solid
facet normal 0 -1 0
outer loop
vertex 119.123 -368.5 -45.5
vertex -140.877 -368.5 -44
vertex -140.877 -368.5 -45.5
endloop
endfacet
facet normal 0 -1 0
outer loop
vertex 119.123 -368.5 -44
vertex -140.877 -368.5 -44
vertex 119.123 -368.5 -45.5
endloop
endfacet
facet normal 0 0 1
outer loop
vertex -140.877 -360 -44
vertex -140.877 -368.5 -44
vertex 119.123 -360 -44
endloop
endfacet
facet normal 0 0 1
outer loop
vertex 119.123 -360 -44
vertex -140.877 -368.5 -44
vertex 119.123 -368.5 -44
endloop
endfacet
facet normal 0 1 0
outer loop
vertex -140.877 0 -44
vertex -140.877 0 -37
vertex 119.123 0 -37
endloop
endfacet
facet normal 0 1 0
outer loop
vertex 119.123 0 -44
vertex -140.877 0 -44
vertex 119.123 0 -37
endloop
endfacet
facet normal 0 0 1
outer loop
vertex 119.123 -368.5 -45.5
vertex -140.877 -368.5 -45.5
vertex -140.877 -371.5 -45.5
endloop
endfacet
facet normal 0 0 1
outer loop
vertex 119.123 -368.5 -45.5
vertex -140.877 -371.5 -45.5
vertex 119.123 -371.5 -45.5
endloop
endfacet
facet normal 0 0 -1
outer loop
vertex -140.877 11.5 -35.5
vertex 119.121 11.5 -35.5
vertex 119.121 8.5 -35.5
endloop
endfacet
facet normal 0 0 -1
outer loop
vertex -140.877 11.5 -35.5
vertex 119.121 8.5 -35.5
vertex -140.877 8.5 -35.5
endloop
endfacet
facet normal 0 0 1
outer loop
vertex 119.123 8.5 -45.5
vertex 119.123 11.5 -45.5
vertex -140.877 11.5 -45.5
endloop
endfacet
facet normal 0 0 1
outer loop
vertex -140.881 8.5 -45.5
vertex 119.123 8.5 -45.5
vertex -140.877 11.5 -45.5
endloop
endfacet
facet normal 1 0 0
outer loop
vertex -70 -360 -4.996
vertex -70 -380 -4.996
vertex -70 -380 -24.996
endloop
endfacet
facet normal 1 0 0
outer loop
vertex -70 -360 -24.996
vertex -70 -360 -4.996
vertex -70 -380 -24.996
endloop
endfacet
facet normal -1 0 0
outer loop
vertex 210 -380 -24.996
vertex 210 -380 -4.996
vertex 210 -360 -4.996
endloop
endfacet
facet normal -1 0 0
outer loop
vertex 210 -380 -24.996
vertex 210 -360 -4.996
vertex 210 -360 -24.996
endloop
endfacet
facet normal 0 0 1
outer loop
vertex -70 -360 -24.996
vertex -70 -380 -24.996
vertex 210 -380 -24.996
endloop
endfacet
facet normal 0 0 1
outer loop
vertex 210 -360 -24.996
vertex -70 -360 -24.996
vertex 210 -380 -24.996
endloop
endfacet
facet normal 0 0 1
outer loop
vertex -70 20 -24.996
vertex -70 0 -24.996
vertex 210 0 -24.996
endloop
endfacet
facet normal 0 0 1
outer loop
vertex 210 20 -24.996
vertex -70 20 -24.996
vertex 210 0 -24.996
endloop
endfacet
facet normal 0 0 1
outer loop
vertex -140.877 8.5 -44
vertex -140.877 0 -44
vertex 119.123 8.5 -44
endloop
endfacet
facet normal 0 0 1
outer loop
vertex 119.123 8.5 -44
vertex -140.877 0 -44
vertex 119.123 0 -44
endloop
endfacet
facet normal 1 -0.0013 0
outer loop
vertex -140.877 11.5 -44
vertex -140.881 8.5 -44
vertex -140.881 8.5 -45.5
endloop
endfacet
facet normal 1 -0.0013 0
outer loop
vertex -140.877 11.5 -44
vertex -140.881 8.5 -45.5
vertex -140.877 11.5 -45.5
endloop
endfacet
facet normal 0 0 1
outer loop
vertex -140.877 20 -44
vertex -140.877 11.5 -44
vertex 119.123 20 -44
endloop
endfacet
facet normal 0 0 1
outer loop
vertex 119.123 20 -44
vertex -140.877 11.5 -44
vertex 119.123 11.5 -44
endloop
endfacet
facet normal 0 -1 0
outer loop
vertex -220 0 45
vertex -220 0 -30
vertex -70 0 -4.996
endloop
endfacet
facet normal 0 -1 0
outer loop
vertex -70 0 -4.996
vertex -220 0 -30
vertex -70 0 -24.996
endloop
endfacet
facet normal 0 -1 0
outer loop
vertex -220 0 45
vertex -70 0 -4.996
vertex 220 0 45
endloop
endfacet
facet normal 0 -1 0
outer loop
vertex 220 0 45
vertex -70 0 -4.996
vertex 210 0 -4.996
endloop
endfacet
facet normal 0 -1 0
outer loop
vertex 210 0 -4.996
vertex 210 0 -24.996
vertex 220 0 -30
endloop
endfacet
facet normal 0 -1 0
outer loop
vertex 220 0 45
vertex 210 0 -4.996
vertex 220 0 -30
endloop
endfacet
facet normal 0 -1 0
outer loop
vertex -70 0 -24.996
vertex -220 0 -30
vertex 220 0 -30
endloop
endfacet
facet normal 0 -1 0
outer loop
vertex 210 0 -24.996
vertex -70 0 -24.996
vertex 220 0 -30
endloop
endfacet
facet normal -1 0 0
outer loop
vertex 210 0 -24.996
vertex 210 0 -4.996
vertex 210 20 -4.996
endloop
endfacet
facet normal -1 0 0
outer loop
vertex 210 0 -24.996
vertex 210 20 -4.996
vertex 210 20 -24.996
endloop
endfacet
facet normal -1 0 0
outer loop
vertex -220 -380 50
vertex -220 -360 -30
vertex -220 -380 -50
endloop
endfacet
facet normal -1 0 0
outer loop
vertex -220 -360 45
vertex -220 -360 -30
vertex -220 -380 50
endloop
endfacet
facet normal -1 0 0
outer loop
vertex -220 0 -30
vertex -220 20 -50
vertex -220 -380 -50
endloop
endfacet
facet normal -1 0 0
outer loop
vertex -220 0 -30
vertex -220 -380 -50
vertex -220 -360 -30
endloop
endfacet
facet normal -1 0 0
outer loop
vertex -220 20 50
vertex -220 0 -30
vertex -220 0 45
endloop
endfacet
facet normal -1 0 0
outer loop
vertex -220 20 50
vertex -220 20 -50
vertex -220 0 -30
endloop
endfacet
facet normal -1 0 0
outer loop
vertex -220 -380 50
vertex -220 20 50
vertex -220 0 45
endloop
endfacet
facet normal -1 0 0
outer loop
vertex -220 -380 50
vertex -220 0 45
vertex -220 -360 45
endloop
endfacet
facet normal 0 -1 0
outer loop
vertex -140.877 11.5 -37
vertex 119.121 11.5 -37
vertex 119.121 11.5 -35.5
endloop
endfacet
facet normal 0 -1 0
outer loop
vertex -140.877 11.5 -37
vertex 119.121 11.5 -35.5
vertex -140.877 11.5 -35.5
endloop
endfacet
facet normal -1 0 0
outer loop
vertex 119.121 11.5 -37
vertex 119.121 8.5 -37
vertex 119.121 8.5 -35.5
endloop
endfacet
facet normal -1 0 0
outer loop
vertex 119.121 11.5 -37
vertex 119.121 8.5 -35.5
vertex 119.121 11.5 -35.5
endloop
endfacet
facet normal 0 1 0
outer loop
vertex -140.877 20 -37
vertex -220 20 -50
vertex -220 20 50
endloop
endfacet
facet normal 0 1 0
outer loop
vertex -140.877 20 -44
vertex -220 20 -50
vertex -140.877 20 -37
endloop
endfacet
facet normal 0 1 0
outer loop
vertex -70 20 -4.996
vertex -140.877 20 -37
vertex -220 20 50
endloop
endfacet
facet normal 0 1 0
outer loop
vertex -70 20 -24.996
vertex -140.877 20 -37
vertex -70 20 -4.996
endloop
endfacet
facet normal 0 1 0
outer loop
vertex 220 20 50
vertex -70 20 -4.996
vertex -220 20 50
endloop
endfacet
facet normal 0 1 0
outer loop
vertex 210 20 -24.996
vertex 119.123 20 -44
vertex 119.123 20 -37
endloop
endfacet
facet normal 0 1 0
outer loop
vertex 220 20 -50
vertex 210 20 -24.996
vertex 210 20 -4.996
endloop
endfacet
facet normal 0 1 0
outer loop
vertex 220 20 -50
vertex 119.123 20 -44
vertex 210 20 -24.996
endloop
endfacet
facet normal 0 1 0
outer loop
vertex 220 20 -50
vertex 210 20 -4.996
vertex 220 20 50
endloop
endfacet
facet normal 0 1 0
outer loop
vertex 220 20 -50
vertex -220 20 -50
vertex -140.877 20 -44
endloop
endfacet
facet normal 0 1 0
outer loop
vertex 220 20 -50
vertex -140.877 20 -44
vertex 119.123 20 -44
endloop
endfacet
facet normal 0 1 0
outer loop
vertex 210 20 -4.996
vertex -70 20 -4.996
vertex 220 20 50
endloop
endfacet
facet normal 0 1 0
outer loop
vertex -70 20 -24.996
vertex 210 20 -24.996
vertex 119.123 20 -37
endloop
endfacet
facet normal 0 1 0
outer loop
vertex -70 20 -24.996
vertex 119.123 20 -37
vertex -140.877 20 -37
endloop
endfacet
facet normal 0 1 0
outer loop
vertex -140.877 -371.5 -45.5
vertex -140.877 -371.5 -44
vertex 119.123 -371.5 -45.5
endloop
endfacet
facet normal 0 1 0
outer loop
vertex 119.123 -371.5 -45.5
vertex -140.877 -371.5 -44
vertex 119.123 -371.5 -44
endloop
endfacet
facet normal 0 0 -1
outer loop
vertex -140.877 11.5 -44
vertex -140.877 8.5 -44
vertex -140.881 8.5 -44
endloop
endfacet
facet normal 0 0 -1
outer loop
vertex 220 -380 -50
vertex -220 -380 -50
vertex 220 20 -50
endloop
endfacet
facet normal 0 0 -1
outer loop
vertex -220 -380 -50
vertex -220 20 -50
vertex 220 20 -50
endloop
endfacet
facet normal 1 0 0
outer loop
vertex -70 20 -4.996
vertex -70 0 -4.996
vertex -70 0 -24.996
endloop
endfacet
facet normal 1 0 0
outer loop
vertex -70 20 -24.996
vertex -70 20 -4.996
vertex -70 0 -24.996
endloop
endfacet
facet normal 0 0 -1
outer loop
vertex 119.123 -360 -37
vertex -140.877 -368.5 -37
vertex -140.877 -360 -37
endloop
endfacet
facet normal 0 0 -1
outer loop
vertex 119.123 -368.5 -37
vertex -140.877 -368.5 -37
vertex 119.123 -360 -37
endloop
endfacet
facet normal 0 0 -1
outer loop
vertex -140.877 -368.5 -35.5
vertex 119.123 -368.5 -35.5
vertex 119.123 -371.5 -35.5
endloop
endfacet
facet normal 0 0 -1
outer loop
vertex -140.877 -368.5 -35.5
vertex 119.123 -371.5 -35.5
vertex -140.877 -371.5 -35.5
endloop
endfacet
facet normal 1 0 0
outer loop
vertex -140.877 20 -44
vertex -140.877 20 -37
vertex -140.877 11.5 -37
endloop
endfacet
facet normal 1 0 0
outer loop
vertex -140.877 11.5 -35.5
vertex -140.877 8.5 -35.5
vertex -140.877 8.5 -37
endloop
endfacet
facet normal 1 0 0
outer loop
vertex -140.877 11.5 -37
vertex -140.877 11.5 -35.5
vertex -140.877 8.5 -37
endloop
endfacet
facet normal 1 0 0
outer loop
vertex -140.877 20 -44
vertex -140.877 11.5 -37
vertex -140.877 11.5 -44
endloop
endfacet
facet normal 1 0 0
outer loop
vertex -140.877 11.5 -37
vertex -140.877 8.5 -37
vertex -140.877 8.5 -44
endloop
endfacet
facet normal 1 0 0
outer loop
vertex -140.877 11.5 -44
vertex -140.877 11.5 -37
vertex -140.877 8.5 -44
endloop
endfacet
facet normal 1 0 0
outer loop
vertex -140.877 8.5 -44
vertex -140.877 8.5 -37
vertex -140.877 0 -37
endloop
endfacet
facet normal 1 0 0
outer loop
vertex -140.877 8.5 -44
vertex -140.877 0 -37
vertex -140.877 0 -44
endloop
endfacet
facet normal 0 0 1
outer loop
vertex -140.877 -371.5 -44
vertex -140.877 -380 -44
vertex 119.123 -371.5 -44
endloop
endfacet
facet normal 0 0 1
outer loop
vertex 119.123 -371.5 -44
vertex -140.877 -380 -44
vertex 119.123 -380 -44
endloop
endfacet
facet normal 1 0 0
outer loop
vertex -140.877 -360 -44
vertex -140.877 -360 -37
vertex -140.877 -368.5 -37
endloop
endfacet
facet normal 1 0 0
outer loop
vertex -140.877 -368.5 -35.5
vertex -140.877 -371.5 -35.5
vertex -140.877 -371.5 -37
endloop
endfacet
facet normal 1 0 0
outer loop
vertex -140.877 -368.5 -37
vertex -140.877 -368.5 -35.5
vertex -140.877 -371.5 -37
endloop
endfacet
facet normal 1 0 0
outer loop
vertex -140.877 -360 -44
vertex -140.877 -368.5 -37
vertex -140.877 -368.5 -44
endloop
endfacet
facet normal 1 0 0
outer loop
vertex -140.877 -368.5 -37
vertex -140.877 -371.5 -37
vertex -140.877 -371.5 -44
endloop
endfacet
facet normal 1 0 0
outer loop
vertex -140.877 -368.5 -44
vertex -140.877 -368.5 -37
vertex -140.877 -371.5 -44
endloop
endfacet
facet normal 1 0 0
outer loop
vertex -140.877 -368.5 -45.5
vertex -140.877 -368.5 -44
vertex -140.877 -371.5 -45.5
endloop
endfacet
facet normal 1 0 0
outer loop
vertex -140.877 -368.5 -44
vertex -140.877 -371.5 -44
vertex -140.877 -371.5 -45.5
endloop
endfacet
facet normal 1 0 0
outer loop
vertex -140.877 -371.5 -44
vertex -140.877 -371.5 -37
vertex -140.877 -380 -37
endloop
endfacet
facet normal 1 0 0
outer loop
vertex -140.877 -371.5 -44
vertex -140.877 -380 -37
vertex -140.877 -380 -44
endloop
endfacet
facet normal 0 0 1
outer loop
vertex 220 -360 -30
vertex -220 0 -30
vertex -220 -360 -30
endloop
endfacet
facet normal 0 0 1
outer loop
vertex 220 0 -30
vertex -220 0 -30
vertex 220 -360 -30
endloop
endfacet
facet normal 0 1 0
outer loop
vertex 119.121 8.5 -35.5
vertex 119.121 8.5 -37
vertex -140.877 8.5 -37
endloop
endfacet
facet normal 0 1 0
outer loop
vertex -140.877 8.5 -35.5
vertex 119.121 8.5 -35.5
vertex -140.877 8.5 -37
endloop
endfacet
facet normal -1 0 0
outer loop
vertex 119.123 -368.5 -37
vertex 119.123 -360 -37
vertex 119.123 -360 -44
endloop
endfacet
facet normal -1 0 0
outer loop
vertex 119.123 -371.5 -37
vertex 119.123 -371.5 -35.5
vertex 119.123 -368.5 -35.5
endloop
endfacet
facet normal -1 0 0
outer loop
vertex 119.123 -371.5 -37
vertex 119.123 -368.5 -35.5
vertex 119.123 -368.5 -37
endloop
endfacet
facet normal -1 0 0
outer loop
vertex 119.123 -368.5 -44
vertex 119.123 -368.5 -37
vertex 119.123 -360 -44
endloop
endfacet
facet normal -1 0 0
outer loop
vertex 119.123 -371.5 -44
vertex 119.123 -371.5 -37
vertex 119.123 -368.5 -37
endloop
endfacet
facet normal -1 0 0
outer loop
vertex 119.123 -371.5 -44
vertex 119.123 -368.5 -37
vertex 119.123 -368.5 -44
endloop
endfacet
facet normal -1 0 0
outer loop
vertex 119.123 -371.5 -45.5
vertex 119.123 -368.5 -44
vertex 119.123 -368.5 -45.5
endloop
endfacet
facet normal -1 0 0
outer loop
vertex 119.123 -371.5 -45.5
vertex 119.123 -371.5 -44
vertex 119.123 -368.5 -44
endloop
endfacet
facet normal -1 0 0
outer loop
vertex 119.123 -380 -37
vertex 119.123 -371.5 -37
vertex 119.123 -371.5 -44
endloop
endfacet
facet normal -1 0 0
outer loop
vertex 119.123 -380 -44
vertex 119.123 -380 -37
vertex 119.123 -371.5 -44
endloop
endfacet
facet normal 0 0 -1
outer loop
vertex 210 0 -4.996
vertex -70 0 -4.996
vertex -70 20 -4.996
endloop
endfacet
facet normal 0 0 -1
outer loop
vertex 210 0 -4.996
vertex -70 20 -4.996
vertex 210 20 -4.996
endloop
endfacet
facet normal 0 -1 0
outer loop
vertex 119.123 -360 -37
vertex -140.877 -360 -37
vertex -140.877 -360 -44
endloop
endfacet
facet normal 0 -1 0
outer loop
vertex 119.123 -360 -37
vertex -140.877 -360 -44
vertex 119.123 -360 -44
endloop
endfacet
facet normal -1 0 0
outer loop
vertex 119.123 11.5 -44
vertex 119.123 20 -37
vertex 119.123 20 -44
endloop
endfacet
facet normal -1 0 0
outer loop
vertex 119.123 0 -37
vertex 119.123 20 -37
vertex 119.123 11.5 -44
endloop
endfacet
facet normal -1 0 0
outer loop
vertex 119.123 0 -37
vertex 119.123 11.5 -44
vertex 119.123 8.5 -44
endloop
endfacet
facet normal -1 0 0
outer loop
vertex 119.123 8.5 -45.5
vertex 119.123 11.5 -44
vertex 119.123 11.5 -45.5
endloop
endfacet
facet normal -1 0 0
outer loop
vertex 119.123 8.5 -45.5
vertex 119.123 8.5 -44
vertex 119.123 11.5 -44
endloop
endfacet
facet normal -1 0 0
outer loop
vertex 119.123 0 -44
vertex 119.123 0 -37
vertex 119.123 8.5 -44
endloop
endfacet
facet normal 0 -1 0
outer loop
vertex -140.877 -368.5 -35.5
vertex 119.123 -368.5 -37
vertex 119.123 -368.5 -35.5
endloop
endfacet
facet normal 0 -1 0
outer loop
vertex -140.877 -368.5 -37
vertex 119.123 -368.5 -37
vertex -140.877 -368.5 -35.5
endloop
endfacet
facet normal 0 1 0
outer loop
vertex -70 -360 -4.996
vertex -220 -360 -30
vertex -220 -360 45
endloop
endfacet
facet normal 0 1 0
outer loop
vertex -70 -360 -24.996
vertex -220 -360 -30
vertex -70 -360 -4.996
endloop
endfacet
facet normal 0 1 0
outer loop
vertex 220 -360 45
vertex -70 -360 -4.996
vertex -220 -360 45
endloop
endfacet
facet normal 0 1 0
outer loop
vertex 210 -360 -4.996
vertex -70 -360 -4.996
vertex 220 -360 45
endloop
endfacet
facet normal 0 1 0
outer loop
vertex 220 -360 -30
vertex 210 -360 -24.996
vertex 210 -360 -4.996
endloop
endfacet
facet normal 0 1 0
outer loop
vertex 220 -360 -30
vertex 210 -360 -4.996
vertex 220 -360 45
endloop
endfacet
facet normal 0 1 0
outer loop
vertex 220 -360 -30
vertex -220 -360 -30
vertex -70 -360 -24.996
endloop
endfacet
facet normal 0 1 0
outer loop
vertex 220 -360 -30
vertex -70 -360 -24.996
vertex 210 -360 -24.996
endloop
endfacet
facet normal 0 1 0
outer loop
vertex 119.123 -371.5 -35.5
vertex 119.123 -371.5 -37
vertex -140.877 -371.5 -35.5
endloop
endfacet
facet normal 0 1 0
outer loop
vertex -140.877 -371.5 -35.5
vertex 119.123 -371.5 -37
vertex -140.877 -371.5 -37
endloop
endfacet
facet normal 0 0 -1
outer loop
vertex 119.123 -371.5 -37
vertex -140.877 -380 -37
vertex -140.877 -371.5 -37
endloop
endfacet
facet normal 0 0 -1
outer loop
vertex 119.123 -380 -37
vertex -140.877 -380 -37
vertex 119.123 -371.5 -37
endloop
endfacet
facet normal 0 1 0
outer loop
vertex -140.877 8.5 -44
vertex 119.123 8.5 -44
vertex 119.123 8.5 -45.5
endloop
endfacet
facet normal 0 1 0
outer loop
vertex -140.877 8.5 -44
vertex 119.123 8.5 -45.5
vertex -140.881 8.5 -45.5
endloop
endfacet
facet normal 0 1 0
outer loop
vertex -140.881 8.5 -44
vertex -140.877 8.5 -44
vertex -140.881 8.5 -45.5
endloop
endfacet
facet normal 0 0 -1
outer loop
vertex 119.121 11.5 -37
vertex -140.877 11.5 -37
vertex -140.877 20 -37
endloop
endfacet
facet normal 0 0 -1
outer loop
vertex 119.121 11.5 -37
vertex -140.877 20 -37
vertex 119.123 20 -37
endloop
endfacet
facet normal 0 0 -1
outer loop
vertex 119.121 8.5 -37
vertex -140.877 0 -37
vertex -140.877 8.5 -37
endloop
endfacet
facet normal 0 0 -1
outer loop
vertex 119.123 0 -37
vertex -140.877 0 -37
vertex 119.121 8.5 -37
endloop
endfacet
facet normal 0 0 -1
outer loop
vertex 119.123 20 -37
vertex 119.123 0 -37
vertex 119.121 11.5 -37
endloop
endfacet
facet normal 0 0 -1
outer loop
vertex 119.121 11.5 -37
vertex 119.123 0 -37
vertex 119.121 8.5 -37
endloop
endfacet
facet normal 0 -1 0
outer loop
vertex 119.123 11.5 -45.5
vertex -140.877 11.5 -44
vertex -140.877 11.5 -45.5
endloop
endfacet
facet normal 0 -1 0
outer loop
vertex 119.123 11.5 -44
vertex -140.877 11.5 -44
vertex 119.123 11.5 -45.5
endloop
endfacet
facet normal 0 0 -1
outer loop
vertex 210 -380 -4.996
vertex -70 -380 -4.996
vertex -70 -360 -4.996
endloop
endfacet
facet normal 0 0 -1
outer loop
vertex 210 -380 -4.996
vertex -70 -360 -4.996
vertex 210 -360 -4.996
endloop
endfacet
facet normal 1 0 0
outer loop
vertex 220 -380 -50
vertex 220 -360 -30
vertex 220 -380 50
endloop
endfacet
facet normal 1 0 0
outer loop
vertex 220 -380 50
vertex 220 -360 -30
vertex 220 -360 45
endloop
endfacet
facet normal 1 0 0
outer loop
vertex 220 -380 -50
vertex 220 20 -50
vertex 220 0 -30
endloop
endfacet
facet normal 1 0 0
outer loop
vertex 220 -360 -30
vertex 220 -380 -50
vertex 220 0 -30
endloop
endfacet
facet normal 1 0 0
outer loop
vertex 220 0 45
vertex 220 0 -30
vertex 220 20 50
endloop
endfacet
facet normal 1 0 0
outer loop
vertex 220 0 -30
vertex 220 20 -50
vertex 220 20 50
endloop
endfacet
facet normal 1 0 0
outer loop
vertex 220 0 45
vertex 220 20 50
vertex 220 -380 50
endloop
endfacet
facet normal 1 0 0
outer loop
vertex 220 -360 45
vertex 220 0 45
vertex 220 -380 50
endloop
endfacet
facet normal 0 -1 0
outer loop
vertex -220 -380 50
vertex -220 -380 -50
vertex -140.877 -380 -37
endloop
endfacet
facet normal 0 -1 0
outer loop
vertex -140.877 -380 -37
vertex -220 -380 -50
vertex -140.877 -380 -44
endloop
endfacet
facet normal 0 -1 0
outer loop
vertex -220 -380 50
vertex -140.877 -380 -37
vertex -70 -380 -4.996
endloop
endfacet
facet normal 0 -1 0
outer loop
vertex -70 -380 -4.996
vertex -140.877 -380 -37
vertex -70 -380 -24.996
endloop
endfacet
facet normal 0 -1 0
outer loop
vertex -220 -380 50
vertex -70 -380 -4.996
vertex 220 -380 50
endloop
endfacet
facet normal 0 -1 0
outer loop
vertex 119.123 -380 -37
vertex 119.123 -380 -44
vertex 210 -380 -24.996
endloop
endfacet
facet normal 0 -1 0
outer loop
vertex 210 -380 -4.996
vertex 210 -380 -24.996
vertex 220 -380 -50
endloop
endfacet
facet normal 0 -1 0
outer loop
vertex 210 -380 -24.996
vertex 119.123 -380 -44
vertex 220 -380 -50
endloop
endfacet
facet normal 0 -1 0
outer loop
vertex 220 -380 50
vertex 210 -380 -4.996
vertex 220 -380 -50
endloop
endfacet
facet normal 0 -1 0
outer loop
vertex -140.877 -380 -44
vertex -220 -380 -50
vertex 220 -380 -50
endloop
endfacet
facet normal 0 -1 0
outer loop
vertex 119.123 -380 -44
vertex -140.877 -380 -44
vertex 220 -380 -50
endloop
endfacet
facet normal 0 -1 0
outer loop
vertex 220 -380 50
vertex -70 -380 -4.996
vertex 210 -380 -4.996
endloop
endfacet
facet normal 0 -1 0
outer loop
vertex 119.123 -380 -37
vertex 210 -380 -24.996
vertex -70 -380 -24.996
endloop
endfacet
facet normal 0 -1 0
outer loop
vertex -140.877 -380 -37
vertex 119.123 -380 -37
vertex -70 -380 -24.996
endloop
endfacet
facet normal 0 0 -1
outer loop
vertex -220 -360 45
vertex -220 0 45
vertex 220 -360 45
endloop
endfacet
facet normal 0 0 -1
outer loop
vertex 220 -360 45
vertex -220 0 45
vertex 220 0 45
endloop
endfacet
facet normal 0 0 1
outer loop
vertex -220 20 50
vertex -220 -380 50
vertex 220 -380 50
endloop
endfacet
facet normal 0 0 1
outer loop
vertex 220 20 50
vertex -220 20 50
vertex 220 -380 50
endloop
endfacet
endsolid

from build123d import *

# Parameters (mm, degrees)
SKETCH1_W           = 440
SKETCH1_H           = 100
SKETCH1_W_2         = 280
SKETCH1_H_2         = 20
SKETCH1_W_3         = 260
SKETCH1_H_3         = 7
BOSS_EXTRUDE1_DEPTH = 20
SKETCH8_W           = 440
SKETCH8_H           = 5
BOSS_EXTRUDE2_DEPTH = 360
LPATTERN2_COUNT     = 2
LPATTERN2_PITCH     = 380
SKETCH10_W          = 440
SKETCH10_H          = 20
BOSS_EXTRUDE3_DEPTH = 360
SKETCH11_W          = 259.997812745
SKETCH11_H          = 3
CUT_EXTRUDE1_DEPTH  = 1.5
CUT_EXTRUDE2_DEPTH  = 1.5
SKETCH17_W          = 260
SKETCH17_H          = 3
CUT_EXTRUDE3_DEPTH  = 1.5
SKETCH18_W          = 260
SKETCH18_H          = 3
CUT_EXTRUDE4_DEPTH  = 1.5


with BuildPart() as part:
    # Sketch1 → Boss-Extrude1 (new body)
    with BuildSketch(Plane(origin=(0, 0, 0), x_dir=(1, 0, 0), z_dir=(0, 1, 0))):
        Rectangle(SKETCH1_W, SKETCH1_H)
        with Locations((70, 14.99604314)):
            Rectangle(SKETCH1_W_2, SKETCH1_H_2, mode=Mode.SUBTRACT)
        with Locations((-10.87698902, 40.5)):
            Rectangle(SKETCH1_W_3, SKETCH1_H_3, mode=Mode.SUBTRACT)
    boss_extrude1 = extrude(amount=BOSS_EXTRUDE1_DEPTH)

    # Sketch8 → Boss-Extrude2 (add)
    with BuildSketch(Plane.XZ):
        with Locations((0, 47.5)):
            Rectangle(SKETCH8_W, SKETCH8_H)
    extrude(amount=BOSS_EXTRUDE2_DEPTH)

    # LPattern2: Boss-Extrude1 ×2
    with Locations(*[(0, -i * LPATTERN2_PITCH, 0) for i in range(1, LPATTERN2_COUNT)]):
        add(boss_extrude1)

    # Sketch10 → Boss-Extrude3 (add)
    with BuildSketch(Plane.XZ):
        with Locations((0, -40)):
            Rectangle(SKETCH10_W, SKETCH10_H)
    extrude(amount=BOSS_EXTRUDE3_DEPTH)

    # Sketch11 → Cut-Extrude1 (cut)
    with BuildSketch(Plane(origin=(0, 0, -37), x_dir=(-1, 0, 0), z_dir=(0, 0, -1))):
        with Locations((10.878082647, 10)):
            Rectangle(SKETCH11_W, SKETCH11_H)
    extrude(amount=-CUT_EXTRUDE1_DEPTH, mode=Mode.SUBTRACT)

    # Sketch16 → Cut-Extrude2 (cut)
    with BuildSketch(Plane.XY.offset(-44)):
        Polygon((-140.87698902, 11.5), (119.12301098, 11.5), (119.12301098, 8.5), (-140.881315907, 8.5), align=None)
    extrude(amount=-CUT_EXTRUDE2_DEPTH, mode=Mode.SUBTRACT)

    # Sketch17 → Cut-Extrude3 (cut)
    with BuildSketch(Plane(origin=(0, 0, -37), x_dir=(-1, 0, 0), z_dir=(0, 0, -1))):
        with Locations((10.87698902, -370)):
            Rectangle(SKETCH17_W, SKETCH17_H)
    extrude(amount=-CUT_EXTRUDE3_DEPTH, mode=Mode.SUBTRACT)

    # Sketch18 → Cut-Extrude4 (cut)
    with BuildSketch(Plane.XY.offset(-44)):
        with Locations((-10.87698902, -370)):
            Rectangle(SKETCH18_W, SKETCH18_H)
    extrude(amount=-CUT_EXTRUDE4_DEPTH, mode=Mode.SUBTRACT)


solid = part.part
